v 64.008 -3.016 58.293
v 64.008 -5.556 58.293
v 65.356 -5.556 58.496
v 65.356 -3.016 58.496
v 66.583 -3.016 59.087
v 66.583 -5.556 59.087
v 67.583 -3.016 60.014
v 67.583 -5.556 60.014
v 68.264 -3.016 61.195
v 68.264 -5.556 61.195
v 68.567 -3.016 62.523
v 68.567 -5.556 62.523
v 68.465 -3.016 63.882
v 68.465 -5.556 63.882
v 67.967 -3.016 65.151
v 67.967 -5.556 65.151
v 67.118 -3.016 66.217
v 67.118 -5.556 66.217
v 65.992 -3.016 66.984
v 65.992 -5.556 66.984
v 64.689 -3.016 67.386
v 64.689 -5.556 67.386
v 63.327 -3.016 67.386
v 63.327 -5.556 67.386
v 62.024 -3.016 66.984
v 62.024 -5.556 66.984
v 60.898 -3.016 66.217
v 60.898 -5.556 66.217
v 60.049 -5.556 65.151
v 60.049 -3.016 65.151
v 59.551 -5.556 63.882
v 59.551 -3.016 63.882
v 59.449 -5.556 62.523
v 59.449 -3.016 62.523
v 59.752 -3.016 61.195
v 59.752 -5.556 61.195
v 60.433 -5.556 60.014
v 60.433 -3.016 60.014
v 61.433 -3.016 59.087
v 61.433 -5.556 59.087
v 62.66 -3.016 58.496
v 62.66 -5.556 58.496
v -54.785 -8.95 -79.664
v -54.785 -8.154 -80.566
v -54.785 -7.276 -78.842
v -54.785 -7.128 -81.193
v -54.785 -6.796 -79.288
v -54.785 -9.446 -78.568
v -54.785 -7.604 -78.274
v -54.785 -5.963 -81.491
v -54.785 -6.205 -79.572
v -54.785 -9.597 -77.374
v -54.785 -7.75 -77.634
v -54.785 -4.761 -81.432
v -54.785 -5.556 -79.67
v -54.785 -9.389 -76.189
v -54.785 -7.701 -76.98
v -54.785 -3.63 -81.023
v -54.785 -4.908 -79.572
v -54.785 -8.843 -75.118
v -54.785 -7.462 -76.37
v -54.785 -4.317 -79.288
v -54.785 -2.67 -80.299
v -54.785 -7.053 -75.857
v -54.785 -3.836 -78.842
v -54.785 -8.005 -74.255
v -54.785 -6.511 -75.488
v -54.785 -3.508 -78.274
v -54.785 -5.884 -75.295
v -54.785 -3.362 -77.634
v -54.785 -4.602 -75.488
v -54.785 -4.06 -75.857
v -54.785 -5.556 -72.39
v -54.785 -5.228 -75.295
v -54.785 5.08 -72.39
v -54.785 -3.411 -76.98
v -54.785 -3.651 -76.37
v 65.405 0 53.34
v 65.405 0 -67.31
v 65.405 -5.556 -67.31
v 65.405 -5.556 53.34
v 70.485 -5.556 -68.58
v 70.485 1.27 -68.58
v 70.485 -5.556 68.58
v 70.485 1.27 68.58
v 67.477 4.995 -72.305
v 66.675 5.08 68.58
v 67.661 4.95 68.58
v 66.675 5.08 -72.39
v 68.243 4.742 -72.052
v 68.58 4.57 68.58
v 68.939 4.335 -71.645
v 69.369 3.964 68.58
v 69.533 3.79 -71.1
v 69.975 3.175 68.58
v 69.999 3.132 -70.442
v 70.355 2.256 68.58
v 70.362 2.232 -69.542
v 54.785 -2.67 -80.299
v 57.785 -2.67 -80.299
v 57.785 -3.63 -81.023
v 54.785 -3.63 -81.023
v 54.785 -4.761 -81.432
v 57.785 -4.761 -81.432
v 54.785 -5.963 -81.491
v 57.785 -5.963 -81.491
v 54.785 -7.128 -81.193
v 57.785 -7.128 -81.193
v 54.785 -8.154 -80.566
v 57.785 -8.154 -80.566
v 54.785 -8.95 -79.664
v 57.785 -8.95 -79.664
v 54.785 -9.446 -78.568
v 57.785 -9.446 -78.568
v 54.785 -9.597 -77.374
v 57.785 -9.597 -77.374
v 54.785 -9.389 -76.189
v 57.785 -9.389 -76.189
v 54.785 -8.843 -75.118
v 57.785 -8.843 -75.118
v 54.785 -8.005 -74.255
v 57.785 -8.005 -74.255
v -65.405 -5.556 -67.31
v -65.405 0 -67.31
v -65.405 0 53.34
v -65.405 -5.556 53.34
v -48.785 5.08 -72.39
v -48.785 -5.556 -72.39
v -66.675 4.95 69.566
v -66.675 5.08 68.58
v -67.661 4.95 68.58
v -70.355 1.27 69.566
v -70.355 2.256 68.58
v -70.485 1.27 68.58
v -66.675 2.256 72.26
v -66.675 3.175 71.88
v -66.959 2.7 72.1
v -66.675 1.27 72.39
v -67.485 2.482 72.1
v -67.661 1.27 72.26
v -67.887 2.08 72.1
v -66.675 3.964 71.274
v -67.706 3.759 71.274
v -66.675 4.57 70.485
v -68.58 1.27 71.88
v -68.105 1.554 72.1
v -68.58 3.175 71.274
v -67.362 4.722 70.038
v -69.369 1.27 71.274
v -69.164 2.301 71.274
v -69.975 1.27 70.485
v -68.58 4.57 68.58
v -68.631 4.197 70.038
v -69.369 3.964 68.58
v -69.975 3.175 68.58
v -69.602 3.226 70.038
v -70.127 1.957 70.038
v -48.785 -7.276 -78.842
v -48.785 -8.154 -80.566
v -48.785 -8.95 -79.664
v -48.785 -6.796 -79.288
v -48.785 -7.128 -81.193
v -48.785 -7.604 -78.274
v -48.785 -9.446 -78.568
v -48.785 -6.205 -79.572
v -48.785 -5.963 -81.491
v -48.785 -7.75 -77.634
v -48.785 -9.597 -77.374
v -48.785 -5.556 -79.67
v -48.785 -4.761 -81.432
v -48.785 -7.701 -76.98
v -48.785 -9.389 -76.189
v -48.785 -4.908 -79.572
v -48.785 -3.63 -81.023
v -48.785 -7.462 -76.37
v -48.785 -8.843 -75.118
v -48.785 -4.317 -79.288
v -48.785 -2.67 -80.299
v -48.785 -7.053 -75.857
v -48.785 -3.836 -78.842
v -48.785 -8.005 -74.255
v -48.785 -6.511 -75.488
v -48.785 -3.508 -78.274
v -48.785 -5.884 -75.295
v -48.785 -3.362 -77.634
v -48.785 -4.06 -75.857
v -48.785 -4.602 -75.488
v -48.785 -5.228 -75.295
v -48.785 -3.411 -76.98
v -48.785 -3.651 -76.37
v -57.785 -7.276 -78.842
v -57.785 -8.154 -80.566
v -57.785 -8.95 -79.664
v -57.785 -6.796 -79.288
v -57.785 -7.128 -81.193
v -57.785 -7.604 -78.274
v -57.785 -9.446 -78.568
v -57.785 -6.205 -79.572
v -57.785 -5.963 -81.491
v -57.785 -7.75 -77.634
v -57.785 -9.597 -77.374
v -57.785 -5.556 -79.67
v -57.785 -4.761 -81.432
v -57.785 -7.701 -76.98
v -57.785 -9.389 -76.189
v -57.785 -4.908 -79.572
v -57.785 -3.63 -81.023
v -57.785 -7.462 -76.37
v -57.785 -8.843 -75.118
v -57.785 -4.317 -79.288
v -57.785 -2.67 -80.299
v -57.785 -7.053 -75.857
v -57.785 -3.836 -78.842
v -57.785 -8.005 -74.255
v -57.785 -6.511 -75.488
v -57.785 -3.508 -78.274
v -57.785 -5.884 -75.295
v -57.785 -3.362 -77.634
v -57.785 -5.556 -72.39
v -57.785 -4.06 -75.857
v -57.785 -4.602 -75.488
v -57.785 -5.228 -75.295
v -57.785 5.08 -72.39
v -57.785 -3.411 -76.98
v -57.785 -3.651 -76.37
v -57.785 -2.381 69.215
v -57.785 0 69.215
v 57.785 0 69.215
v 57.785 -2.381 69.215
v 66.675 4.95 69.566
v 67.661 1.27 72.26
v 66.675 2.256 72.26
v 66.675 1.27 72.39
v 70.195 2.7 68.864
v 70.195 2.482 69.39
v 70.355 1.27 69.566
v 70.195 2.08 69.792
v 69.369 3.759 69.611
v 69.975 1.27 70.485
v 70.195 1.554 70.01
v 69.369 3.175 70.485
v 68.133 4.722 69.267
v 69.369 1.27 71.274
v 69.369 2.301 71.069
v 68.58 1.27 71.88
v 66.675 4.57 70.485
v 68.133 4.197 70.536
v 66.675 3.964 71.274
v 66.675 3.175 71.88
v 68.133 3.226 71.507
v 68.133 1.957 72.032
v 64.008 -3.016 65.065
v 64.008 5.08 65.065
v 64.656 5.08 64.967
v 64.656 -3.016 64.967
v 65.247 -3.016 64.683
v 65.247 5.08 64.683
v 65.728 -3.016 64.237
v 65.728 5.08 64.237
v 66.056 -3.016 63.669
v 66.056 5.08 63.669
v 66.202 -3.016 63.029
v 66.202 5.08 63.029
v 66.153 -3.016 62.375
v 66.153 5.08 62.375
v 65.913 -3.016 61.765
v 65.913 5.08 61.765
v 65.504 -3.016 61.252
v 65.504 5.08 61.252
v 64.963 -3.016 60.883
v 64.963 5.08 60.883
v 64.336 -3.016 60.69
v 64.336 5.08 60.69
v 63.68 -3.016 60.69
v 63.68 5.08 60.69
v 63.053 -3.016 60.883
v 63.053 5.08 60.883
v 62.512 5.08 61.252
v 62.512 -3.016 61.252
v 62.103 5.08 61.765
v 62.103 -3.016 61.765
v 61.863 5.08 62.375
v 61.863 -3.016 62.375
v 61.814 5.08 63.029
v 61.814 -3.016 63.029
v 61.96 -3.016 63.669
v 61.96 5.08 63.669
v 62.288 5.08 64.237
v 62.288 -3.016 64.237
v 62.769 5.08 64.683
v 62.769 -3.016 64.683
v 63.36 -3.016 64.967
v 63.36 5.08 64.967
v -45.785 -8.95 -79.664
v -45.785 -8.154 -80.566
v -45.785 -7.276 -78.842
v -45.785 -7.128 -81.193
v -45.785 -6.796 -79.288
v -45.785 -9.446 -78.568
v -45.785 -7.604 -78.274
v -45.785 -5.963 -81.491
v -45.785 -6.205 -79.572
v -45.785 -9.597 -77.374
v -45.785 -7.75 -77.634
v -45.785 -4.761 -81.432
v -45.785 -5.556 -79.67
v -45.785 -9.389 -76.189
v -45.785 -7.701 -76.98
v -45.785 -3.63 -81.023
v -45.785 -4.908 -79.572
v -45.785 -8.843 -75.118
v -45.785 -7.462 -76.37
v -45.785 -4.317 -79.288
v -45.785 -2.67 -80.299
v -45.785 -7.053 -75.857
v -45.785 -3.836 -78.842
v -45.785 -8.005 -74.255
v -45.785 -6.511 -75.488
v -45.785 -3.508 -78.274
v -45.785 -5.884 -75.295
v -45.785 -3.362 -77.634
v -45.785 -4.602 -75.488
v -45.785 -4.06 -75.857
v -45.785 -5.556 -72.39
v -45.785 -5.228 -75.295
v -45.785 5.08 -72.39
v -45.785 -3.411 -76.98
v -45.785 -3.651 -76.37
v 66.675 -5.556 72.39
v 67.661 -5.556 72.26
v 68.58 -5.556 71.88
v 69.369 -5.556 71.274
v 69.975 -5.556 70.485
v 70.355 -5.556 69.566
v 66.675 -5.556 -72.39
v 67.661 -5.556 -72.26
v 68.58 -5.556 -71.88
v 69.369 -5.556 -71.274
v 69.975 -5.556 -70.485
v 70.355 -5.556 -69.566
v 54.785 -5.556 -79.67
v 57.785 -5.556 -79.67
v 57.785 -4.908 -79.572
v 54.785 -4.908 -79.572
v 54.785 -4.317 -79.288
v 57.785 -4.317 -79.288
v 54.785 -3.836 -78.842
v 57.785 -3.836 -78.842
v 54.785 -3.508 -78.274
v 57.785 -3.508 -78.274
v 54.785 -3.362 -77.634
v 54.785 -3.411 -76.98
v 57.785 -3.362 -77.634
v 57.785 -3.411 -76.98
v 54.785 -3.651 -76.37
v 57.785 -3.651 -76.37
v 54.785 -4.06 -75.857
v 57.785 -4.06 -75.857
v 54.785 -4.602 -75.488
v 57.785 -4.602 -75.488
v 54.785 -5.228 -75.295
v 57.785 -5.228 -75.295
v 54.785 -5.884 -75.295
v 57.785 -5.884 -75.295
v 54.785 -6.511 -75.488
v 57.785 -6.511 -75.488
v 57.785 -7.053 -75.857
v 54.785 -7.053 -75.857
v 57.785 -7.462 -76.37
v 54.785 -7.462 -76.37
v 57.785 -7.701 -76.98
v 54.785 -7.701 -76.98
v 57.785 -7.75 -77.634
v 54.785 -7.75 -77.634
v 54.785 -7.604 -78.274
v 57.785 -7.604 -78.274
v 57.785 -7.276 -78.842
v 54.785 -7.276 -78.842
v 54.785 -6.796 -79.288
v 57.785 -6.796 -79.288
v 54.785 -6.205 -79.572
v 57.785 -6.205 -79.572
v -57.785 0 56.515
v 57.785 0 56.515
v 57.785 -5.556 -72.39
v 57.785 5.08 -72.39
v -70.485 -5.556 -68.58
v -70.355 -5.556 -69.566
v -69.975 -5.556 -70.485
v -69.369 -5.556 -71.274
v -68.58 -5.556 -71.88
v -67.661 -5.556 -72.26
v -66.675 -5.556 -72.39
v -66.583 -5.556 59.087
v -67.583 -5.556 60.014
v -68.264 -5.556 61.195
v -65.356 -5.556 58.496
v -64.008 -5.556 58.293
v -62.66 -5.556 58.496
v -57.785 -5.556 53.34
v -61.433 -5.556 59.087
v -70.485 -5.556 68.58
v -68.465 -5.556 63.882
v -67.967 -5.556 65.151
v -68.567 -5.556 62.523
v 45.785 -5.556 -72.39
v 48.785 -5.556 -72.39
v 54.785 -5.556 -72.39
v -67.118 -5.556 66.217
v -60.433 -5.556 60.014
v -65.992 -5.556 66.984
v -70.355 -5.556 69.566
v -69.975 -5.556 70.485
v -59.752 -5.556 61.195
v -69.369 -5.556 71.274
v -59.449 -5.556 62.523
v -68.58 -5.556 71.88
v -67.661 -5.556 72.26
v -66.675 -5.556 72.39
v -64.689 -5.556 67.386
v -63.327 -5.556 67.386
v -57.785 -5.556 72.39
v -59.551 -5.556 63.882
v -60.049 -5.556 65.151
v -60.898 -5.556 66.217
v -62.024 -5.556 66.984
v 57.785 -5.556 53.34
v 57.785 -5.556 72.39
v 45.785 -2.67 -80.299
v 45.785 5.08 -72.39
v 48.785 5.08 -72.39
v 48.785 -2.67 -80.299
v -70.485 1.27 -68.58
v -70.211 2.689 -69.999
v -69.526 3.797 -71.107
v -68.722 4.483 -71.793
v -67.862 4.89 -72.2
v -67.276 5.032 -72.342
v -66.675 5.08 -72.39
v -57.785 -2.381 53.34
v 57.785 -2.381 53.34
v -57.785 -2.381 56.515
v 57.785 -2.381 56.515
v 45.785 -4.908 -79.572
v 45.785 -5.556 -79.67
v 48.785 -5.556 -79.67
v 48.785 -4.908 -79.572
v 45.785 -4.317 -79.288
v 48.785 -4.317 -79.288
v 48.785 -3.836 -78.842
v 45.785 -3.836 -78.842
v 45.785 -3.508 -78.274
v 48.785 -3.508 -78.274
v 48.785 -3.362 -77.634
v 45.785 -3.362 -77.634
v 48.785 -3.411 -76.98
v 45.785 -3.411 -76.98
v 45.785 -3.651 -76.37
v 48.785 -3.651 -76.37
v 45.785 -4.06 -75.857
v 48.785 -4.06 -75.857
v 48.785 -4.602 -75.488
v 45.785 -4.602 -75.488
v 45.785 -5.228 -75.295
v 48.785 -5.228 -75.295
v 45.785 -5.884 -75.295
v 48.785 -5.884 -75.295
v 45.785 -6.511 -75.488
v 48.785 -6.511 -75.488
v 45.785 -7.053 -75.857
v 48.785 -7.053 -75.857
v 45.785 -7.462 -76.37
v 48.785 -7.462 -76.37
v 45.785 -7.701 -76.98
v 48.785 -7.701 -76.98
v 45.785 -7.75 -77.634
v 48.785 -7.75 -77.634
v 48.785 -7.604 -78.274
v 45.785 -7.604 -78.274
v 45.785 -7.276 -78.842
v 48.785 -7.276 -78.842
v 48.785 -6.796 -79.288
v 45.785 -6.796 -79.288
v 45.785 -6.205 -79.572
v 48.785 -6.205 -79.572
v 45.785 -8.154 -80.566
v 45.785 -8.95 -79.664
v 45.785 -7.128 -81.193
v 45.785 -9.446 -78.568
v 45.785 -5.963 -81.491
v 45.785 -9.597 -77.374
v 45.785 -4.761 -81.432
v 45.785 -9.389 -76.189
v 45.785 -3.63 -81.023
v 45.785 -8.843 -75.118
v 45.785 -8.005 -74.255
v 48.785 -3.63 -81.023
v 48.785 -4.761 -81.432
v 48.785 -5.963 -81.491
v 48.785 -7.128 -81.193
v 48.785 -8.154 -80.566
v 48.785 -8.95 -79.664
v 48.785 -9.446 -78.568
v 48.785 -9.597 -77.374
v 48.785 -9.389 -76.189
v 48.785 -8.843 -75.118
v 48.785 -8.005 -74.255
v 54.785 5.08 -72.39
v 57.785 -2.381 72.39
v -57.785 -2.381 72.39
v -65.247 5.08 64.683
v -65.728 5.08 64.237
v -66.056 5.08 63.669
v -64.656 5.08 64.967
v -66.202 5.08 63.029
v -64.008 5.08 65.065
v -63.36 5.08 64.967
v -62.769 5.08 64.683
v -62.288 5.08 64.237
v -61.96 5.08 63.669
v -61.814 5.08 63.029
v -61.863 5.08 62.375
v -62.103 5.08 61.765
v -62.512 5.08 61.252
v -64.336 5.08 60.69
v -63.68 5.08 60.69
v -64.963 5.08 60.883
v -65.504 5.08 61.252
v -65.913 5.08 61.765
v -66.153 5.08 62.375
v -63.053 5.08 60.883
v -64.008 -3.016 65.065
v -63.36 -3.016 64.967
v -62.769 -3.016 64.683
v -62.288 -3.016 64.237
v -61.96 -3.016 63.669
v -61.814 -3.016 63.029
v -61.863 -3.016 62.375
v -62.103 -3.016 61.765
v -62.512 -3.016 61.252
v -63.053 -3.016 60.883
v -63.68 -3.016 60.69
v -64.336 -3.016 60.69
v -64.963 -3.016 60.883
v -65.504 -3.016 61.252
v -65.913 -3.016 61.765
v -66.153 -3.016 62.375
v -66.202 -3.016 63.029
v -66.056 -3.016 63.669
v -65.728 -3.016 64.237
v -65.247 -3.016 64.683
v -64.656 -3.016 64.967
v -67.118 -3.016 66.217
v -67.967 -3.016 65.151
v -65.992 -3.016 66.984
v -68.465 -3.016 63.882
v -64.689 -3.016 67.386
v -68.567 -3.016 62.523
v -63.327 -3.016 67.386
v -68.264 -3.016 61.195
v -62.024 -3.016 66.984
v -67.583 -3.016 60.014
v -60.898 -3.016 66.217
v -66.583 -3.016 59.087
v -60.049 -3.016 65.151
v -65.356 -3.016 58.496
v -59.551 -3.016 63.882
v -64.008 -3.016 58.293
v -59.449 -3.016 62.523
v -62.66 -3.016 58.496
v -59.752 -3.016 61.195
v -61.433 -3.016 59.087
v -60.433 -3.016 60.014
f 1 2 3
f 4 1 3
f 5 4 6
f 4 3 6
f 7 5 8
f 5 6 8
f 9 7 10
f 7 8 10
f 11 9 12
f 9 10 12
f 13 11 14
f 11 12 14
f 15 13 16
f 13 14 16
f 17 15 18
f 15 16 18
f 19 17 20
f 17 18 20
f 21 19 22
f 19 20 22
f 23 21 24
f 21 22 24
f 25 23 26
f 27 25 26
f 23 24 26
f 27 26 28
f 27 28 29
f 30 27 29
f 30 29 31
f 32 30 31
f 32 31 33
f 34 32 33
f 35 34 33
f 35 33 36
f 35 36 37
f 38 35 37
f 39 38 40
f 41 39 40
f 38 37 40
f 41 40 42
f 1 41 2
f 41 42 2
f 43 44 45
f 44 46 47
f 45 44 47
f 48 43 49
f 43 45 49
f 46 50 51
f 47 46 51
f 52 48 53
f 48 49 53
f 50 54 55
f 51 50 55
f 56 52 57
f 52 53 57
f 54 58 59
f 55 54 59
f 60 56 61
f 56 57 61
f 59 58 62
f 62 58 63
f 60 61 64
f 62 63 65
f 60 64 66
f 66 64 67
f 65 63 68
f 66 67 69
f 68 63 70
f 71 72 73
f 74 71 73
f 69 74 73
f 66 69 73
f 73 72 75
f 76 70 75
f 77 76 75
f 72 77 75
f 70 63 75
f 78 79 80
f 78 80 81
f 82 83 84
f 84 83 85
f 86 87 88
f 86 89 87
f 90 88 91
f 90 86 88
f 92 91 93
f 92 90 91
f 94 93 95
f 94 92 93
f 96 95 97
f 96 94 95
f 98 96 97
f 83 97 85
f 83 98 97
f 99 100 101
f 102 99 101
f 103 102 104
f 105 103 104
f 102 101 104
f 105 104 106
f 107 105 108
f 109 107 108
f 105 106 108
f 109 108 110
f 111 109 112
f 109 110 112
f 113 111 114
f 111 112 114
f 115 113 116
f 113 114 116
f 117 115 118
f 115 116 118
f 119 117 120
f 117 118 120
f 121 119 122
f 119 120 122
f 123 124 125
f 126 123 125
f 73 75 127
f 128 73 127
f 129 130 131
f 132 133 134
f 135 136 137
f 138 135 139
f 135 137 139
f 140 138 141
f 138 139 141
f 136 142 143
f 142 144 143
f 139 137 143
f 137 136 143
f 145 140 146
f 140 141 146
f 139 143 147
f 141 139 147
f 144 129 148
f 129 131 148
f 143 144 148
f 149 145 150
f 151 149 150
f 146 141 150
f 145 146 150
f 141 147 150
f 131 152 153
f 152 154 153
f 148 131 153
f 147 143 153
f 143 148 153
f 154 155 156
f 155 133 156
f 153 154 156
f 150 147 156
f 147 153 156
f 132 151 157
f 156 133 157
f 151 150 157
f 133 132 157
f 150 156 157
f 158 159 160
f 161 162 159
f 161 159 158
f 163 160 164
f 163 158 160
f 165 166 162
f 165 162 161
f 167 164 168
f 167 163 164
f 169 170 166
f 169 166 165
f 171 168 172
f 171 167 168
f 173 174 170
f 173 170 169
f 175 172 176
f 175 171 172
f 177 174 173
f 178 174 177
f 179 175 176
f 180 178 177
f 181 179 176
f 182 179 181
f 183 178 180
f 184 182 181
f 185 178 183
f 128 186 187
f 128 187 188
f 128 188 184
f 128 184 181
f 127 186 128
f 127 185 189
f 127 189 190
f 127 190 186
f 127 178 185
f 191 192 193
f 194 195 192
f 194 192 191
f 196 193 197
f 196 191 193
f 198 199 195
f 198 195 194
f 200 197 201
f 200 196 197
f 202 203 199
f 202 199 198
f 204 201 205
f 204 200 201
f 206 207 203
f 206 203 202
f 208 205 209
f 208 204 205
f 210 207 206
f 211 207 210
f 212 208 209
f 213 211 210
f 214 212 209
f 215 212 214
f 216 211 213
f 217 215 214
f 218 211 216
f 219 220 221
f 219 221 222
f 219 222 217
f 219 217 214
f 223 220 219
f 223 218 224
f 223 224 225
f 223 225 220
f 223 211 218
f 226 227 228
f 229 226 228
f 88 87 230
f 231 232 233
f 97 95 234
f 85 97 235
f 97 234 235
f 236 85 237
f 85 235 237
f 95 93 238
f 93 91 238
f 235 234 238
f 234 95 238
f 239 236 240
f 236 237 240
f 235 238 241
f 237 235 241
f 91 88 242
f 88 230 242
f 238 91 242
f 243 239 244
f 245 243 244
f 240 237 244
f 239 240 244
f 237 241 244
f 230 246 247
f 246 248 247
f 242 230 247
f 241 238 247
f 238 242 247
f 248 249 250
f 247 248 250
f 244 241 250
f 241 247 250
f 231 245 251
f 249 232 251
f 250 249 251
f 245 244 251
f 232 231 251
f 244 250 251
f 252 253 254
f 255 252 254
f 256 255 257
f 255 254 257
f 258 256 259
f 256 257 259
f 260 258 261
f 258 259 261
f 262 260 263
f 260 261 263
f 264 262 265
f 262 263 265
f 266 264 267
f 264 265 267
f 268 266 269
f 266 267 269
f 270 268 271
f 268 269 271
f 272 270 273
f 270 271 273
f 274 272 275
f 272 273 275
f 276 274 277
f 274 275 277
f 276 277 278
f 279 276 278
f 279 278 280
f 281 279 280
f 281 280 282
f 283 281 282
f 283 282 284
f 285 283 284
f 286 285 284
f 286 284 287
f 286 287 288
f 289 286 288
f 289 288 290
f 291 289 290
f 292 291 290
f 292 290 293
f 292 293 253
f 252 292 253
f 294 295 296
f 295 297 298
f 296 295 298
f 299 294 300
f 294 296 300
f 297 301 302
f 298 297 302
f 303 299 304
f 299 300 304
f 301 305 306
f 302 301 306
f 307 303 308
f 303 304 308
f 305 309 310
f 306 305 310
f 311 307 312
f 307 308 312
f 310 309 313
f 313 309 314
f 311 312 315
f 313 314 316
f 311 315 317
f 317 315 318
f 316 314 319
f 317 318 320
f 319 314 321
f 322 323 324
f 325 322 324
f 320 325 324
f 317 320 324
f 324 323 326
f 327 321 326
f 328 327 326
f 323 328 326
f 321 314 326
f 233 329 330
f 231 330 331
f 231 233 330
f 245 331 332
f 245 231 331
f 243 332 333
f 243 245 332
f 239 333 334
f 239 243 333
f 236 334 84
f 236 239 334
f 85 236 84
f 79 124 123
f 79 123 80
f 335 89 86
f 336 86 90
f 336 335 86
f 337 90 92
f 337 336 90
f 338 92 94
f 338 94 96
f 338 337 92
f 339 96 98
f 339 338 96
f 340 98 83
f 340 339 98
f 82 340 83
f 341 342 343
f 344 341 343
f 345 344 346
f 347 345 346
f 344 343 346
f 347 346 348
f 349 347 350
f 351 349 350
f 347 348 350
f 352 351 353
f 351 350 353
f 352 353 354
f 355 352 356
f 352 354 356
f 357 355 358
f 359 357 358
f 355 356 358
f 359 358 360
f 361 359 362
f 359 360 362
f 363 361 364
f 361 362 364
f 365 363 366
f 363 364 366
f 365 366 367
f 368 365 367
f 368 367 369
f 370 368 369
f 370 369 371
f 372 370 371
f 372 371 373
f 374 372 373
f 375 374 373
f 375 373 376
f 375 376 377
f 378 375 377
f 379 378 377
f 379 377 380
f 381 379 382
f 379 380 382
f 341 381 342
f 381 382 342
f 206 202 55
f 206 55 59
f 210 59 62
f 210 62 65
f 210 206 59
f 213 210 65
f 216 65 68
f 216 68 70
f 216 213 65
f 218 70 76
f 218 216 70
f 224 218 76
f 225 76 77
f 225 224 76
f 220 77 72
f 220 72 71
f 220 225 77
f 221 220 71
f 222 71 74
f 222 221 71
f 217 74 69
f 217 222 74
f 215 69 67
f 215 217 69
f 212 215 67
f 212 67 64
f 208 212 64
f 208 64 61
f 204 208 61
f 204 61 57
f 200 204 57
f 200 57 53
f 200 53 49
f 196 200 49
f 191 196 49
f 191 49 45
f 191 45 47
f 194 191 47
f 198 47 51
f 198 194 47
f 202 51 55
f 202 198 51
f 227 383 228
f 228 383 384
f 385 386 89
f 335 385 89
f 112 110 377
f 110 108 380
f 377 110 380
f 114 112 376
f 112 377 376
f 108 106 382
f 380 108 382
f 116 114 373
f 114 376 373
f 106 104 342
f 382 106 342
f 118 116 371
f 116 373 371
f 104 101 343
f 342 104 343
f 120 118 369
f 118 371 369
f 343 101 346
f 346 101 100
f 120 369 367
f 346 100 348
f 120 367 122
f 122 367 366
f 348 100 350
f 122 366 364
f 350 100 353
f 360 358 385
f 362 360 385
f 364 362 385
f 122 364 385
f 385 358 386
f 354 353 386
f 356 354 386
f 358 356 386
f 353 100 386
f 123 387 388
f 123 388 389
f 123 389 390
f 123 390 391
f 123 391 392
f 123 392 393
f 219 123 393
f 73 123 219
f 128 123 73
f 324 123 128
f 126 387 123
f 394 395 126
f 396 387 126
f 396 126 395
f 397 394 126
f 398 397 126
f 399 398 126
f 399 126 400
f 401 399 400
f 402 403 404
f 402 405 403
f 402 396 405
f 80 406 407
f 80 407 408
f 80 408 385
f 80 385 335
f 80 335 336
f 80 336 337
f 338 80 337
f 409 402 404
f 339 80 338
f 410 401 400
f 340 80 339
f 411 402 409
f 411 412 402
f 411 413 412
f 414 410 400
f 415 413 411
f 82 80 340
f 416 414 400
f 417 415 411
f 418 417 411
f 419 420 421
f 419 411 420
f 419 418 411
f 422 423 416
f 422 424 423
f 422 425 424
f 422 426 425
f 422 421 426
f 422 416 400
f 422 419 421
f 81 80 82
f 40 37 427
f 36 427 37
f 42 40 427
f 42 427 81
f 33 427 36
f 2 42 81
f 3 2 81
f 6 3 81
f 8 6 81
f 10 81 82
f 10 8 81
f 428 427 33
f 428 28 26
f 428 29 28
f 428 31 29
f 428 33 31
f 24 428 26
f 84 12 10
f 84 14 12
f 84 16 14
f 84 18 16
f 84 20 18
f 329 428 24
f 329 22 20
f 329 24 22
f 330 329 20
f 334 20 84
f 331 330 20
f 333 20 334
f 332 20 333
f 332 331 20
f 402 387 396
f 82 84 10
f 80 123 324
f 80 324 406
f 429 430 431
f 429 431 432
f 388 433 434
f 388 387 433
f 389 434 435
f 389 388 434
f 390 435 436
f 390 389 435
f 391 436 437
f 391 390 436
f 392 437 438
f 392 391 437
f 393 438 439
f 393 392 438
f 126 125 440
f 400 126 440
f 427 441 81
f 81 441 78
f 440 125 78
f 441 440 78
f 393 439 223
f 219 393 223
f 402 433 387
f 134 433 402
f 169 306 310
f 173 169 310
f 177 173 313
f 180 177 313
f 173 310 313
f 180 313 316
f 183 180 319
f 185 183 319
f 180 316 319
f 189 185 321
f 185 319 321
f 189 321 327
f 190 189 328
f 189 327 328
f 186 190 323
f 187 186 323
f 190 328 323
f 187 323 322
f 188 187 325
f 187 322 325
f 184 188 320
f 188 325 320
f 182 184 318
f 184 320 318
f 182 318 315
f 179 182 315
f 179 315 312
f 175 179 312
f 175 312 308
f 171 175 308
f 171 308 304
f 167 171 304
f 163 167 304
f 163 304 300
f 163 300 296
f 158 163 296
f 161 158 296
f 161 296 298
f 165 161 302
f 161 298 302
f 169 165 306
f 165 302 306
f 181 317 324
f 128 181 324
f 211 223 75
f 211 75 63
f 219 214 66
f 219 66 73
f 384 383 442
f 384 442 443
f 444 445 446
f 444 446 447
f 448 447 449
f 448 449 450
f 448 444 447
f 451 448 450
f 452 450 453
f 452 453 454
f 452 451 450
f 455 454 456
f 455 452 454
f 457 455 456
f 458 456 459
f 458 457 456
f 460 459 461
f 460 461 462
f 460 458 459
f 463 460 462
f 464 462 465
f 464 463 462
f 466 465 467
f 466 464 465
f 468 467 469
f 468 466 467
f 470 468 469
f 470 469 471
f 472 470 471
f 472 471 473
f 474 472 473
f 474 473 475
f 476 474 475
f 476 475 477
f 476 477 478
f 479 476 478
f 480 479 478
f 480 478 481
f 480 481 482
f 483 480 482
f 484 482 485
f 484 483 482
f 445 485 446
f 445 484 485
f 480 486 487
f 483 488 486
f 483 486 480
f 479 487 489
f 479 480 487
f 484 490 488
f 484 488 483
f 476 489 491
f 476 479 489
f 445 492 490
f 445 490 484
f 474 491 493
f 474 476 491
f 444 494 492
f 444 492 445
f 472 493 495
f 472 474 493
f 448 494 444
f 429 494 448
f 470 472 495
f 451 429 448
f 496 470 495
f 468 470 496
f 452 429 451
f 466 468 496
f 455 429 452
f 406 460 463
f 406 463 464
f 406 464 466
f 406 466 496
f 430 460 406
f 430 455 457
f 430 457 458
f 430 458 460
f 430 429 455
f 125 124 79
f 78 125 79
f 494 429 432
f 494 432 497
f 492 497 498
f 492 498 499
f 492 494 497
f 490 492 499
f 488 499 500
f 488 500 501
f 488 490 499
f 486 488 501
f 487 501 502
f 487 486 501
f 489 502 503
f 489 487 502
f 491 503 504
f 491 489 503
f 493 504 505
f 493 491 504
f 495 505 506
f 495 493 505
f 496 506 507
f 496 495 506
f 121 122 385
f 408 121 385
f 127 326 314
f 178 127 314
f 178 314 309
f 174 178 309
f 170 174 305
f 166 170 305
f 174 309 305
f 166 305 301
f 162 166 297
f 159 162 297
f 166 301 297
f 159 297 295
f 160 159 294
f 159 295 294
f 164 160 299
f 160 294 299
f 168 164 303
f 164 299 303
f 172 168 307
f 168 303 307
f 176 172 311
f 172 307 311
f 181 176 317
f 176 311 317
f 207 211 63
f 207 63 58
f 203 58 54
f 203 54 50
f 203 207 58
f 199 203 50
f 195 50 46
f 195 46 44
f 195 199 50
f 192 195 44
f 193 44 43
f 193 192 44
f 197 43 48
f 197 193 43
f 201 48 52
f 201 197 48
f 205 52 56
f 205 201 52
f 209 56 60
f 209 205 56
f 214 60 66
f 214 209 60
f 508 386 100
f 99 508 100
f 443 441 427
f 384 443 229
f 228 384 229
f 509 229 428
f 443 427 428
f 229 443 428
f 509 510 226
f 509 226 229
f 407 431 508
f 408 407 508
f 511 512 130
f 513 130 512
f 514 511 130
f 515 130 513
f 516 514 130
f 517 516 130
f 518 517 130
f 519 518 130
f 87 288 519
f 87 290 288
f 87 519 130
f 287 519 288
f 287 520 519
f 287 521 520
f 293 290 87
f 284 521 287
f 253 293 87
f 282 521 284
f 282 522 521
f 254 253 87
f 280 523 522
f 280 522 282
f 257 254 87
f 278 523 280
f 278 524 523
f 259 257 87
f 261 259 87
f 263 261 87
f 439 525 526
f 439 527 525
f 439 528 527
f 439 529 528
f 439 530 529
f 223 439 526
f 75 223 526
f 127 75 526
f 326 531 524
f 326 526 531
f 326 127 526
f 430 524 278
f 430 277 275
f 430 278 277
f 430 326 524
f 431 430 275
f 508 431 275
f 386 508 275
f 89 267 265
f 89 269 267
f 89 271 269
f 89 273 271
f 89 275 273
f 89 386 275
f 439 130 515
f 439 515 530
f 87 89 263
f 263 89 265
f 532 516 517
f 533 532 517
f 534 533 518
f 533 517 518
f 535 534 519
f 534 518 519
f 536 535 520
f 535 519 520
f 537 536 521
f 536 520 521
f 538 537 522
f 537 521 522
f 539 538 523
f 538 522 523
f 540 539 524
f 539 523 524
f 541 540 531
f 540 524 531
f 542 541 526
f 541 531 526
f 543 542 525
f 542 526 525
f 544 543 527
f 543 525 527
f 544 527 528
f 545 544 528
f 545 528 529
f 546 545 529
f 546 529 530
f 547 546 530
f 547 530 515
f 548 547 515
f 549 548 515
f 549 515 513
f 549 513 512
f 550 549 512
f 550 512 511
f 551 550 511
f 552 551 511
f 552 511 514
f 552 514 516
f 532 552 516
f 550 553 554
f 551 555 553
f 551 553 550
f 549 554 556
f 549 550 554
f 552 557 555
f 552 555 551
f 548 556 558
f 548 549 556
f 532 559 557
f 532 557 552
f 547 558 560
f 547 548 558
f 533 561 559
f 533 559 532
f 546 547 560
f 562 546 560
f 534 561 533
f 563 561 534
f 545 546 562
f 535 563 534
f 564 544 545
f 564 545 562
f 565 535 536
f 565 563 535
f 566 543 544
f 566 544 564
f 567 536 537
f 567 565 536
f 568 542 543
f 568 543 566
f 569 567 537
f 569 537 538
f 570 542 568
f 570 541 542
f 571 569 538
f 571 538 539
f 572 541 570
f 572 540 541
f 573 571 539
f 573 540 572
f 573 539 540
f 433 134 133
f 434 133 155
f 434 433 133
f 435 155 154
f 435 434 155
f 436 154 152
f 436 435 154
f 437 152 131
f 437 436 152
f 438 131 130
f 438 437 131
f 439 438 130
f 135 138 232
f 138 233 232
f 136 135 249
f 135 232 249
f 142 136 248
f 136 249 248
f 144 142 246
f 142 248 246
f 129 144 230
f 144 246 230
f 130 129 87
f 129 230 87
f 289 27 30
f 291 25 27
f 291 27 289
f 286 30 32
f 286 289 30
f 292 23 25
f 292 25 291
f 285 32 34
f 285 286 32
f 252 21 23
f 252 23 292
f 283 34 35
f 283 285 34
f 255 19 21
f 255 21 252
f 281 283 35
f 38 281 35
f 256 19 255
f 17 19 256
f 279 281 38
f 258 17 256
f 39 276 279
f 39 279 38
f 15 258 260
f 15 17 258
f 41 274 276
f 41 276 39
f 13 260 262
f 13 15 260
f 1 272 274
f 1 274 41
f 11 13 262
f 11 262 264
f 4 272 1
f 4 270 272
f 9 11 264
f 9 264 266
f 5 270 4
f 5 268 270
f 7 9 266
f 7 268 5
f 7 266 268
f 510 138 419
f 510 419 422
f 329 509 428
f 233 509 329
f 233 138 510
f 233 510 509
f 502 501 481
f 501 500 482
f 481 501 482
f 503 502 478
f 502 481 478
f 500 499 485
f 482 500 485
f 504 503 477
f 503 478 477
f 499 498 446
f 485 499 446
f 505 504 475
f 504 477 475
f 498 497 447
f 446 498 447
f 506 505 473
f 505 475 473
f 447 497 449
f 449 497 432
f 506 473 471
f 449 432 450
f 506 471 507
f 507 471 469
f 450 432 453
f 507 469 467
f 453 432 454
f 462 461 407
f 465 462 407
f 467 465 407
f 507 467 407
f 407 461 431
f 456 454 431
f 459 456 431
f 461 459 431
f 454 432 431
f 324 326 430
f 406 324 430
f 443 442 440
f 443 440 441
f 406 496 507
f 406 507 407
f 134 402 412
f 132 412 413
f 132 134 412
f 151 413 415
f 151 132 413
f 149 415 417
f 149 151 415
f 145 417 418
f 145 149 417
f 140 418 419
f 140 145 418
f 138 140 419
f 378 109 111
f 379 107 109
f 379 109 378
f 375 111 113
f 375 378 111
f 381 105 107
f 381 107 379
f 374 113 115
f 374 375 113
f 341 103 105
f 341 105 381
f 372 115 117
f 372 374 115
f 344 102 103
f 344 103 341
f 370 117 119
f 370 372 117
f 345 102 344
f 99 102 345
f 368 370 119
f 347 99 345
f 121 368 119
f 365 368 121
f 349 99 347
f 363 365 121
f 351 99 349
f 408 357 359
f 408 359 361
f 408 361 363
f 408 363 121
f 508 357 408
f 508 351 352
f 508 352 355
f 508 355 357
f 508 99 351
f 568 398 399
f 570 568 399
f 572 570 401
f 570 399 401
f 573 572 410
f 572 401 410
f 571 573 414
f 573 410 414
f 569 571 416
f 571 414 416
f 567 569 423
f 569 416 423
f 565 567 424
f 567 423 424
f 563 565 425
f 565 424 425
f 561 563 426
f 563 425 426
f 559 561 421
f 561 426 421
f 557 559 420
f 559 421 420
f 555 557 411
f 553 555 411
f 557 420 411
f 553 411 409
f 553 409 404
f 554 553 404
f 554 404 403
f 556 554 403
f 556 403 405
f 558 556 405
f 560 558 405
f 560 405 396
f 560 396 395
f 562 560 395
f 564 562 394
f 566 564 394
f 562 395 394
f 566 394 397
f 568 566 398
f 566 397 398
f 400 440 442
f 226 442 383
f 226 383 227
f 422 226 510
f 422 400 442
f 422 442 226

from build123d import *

# Parameters (mm, degrees)
SKETCH1_W               = 140.97
SKETCH1_H               = 144.78
BOSS_EXTRUDE1_DEPTH     = 5.08
SKETCH2_W               = 140.97
SKETCH2_H               = 144.78
SKETCH2_W_2             = 115.57
SKETCH2_H_2             = 12.7
SKETCH2_W_3             = 130.81
SKETCH2_H_3             = 120.65
BOSS_EXTRUDE2_DEPTH     = 5.55625
SKETCH3_W               = 115.57
SKETCH3_H               = 19.05
CUT_EXTRUDE1_DEPTH      = 3.175
SKETCH4_R               = 2.2
BOSS_EXTRUDE3_DEPTH     = 3
MIRROR2_COPY_1_SKETCH_R = 2.2
MIRROR2_COPY_1_DEPTH    = 3
SKETCH5_R               = 2.2
CUT_EXTRUDE2_DEPTH      = 109.755169743
SKETCH6_R               = 4.572
CUT_EXTRUDE3_DEPTH      = 2.54
FILLET1_R               = 3.81


with BuildPart() as part:
    # Sketch1 → Boss-Extrude1 (new body)
    with BuildSketch(Plane(origin=(0, 0, 0), x_dir=(1, 0, 0), z_dir=(0, 1, 0))):
        Rectangle(SKETCH1_W, SKETCH1_H)
    extrude(amount=BOSS_EXTRUDE1_DEPTH)

    # Sketch2 → Boss-Extrude2 (add)
    with BuildSketch(Plane.XZ):
        Rectangle(SKETCH2_W, SKETCH2_H)
        with Locations((0, 62.865)):
            Rectangle(SKETCH2_W_2, SKETCH2_H_2, mode=Mode.SUBTRACT)
        with Locations((0, -6.985)):
            Rectangle(SKETCH2_W_3, SKETCH2_H_3, mode=Mode.SUBTRACT)
    extrude(amount=BOSS_EXTRUDE2_DEPTH)

    # Sketch3 → Cut-Extrude1 (cut)
    with BuildSketch(Plane.XZ.offset(5.55625)):
        with Locations((0, 62.865)):
            Rectangle(SKETCH3_W, SKETCH3_H)
    extrude(amount=-CUT_EXTRUDE1_DEPTH, mode=Mode.SUBTRACT)

    # Sketch4 → Boss-Extrude3 (add)
    with BuildSketch(Plane(origin=(57.785, 0, 0), x_dir=(0, 0, -1), z_dir=(1, 0, 0))):
        with BuildLine():
            Line((72.39, 5.08), (80.298586194, -2.669654518))
            ThreePointArc((80.298586194, -2.669654518), (80.144596616, -8.586079413), (74.254776903, -8.004856495))
            Line((74.254776903, -8.004856495), (72.39, -5.55625))
            Line((72.39, -5.55625), (72.39, 5.08))
        make_face()
        with Locations((77.47, -5.55625)):
            Circle(SKETCH4_R, mode=Mode.SUBTRACT)
    boss_extrude3 = extrude(amount=-BOSS_EXTRUDE3_DEPTH)

    # Mirror1: Boss-Extrude3 across plane
    add(boss_extrude3.mirror(Plane.ZY.offset(-51.784999904)))

    # Mirror2: Boss-Extrude3 across plane
    add(boss_extrude3.mirror(Plane(origin=(0, 0, 0), x_dir=(0, 0, 1), z_dir=(1, 0, 0))))

    # Mirror2 copy 1 sketch → Mirror2 copy 1 (add)
    with BuildSketch(Plane(origin=(-45.784999808, 0, 0), x_dir=(0, 0, -1), z_dir=(1, 0, 0))):
        with BuildLine():
            Line((72.39, 5.08), (80.298586194, -2.669654518))
            ThreePointArc((80.298586194, -2.669654518), (80.144596616, -8.586079413), (74.254776903, -8.004856495))
            Line((74.254776903, -8.004856495), (72.39, -5.55625))
            Line((72.39, -5.55625), (72.39, 5.08))
        make_face()
        with Locations((77.47, -5.55625)):
            Circle(MIRROR2_COPY_1_SKETCH_R, mode=Mode.SUBTRACT)
    extrude(amount=-MIRROR2_COPY_1_DEPTH)

    # Sketch5 → Cut-Extrude2 (cut, through all)
    with BuildSketch(Plane(origin=(0, 5.08, 0), x_dir=(1, 0, 0), z_dir=(0, 1, 0))):
        with Locations(Location((64.008, -62.865, 0), (0, 0, 270))):
            Circle(SKETCH5_R)
        with Locations(Location((-64.008, -62.865, 0), (0, 0, 270))):
            Circle(SKETCH5_R)
    extrude(amount=-CUT_EXTRUDE2_DEPTH, mode=Mode.SUBTRACT)

    # Sketch6 → Cut-Extrude3 (cut)
    with BuildSketch(Plane.XZ.offset(5.55625)):
        with Locations(Location((-64.008, 62.865, 0), (0, 0, 270))):
            Circle(SKETCH6_R)
        with Locations(Location((64.008, 62.865, 0), (0, 0, 270))):
            Circle(SKETCH6_R)
    extrude(amount=-CUT_EXTRUDE3_DEPTH, mode=Mode.SUBTRACT)

    # Fillet1
    fillet1_edges = [part.edges().sort_by_distance(p)[0] for p in [
        (-70.485, 5.08, 0),
        (0, 5.08, 72.39),
        (70.485, 5.08, 0),
        (70.485, -0.238125, 72.39),
        (-70.485, -0.238125, 72.39),
        (-70.485, -0.238125, -72.39),
        (70.485, -0.238125, -72.39),
    ]]
    fillet(fillet1_edges, radius=FILLET1_R)


solid = part.part
